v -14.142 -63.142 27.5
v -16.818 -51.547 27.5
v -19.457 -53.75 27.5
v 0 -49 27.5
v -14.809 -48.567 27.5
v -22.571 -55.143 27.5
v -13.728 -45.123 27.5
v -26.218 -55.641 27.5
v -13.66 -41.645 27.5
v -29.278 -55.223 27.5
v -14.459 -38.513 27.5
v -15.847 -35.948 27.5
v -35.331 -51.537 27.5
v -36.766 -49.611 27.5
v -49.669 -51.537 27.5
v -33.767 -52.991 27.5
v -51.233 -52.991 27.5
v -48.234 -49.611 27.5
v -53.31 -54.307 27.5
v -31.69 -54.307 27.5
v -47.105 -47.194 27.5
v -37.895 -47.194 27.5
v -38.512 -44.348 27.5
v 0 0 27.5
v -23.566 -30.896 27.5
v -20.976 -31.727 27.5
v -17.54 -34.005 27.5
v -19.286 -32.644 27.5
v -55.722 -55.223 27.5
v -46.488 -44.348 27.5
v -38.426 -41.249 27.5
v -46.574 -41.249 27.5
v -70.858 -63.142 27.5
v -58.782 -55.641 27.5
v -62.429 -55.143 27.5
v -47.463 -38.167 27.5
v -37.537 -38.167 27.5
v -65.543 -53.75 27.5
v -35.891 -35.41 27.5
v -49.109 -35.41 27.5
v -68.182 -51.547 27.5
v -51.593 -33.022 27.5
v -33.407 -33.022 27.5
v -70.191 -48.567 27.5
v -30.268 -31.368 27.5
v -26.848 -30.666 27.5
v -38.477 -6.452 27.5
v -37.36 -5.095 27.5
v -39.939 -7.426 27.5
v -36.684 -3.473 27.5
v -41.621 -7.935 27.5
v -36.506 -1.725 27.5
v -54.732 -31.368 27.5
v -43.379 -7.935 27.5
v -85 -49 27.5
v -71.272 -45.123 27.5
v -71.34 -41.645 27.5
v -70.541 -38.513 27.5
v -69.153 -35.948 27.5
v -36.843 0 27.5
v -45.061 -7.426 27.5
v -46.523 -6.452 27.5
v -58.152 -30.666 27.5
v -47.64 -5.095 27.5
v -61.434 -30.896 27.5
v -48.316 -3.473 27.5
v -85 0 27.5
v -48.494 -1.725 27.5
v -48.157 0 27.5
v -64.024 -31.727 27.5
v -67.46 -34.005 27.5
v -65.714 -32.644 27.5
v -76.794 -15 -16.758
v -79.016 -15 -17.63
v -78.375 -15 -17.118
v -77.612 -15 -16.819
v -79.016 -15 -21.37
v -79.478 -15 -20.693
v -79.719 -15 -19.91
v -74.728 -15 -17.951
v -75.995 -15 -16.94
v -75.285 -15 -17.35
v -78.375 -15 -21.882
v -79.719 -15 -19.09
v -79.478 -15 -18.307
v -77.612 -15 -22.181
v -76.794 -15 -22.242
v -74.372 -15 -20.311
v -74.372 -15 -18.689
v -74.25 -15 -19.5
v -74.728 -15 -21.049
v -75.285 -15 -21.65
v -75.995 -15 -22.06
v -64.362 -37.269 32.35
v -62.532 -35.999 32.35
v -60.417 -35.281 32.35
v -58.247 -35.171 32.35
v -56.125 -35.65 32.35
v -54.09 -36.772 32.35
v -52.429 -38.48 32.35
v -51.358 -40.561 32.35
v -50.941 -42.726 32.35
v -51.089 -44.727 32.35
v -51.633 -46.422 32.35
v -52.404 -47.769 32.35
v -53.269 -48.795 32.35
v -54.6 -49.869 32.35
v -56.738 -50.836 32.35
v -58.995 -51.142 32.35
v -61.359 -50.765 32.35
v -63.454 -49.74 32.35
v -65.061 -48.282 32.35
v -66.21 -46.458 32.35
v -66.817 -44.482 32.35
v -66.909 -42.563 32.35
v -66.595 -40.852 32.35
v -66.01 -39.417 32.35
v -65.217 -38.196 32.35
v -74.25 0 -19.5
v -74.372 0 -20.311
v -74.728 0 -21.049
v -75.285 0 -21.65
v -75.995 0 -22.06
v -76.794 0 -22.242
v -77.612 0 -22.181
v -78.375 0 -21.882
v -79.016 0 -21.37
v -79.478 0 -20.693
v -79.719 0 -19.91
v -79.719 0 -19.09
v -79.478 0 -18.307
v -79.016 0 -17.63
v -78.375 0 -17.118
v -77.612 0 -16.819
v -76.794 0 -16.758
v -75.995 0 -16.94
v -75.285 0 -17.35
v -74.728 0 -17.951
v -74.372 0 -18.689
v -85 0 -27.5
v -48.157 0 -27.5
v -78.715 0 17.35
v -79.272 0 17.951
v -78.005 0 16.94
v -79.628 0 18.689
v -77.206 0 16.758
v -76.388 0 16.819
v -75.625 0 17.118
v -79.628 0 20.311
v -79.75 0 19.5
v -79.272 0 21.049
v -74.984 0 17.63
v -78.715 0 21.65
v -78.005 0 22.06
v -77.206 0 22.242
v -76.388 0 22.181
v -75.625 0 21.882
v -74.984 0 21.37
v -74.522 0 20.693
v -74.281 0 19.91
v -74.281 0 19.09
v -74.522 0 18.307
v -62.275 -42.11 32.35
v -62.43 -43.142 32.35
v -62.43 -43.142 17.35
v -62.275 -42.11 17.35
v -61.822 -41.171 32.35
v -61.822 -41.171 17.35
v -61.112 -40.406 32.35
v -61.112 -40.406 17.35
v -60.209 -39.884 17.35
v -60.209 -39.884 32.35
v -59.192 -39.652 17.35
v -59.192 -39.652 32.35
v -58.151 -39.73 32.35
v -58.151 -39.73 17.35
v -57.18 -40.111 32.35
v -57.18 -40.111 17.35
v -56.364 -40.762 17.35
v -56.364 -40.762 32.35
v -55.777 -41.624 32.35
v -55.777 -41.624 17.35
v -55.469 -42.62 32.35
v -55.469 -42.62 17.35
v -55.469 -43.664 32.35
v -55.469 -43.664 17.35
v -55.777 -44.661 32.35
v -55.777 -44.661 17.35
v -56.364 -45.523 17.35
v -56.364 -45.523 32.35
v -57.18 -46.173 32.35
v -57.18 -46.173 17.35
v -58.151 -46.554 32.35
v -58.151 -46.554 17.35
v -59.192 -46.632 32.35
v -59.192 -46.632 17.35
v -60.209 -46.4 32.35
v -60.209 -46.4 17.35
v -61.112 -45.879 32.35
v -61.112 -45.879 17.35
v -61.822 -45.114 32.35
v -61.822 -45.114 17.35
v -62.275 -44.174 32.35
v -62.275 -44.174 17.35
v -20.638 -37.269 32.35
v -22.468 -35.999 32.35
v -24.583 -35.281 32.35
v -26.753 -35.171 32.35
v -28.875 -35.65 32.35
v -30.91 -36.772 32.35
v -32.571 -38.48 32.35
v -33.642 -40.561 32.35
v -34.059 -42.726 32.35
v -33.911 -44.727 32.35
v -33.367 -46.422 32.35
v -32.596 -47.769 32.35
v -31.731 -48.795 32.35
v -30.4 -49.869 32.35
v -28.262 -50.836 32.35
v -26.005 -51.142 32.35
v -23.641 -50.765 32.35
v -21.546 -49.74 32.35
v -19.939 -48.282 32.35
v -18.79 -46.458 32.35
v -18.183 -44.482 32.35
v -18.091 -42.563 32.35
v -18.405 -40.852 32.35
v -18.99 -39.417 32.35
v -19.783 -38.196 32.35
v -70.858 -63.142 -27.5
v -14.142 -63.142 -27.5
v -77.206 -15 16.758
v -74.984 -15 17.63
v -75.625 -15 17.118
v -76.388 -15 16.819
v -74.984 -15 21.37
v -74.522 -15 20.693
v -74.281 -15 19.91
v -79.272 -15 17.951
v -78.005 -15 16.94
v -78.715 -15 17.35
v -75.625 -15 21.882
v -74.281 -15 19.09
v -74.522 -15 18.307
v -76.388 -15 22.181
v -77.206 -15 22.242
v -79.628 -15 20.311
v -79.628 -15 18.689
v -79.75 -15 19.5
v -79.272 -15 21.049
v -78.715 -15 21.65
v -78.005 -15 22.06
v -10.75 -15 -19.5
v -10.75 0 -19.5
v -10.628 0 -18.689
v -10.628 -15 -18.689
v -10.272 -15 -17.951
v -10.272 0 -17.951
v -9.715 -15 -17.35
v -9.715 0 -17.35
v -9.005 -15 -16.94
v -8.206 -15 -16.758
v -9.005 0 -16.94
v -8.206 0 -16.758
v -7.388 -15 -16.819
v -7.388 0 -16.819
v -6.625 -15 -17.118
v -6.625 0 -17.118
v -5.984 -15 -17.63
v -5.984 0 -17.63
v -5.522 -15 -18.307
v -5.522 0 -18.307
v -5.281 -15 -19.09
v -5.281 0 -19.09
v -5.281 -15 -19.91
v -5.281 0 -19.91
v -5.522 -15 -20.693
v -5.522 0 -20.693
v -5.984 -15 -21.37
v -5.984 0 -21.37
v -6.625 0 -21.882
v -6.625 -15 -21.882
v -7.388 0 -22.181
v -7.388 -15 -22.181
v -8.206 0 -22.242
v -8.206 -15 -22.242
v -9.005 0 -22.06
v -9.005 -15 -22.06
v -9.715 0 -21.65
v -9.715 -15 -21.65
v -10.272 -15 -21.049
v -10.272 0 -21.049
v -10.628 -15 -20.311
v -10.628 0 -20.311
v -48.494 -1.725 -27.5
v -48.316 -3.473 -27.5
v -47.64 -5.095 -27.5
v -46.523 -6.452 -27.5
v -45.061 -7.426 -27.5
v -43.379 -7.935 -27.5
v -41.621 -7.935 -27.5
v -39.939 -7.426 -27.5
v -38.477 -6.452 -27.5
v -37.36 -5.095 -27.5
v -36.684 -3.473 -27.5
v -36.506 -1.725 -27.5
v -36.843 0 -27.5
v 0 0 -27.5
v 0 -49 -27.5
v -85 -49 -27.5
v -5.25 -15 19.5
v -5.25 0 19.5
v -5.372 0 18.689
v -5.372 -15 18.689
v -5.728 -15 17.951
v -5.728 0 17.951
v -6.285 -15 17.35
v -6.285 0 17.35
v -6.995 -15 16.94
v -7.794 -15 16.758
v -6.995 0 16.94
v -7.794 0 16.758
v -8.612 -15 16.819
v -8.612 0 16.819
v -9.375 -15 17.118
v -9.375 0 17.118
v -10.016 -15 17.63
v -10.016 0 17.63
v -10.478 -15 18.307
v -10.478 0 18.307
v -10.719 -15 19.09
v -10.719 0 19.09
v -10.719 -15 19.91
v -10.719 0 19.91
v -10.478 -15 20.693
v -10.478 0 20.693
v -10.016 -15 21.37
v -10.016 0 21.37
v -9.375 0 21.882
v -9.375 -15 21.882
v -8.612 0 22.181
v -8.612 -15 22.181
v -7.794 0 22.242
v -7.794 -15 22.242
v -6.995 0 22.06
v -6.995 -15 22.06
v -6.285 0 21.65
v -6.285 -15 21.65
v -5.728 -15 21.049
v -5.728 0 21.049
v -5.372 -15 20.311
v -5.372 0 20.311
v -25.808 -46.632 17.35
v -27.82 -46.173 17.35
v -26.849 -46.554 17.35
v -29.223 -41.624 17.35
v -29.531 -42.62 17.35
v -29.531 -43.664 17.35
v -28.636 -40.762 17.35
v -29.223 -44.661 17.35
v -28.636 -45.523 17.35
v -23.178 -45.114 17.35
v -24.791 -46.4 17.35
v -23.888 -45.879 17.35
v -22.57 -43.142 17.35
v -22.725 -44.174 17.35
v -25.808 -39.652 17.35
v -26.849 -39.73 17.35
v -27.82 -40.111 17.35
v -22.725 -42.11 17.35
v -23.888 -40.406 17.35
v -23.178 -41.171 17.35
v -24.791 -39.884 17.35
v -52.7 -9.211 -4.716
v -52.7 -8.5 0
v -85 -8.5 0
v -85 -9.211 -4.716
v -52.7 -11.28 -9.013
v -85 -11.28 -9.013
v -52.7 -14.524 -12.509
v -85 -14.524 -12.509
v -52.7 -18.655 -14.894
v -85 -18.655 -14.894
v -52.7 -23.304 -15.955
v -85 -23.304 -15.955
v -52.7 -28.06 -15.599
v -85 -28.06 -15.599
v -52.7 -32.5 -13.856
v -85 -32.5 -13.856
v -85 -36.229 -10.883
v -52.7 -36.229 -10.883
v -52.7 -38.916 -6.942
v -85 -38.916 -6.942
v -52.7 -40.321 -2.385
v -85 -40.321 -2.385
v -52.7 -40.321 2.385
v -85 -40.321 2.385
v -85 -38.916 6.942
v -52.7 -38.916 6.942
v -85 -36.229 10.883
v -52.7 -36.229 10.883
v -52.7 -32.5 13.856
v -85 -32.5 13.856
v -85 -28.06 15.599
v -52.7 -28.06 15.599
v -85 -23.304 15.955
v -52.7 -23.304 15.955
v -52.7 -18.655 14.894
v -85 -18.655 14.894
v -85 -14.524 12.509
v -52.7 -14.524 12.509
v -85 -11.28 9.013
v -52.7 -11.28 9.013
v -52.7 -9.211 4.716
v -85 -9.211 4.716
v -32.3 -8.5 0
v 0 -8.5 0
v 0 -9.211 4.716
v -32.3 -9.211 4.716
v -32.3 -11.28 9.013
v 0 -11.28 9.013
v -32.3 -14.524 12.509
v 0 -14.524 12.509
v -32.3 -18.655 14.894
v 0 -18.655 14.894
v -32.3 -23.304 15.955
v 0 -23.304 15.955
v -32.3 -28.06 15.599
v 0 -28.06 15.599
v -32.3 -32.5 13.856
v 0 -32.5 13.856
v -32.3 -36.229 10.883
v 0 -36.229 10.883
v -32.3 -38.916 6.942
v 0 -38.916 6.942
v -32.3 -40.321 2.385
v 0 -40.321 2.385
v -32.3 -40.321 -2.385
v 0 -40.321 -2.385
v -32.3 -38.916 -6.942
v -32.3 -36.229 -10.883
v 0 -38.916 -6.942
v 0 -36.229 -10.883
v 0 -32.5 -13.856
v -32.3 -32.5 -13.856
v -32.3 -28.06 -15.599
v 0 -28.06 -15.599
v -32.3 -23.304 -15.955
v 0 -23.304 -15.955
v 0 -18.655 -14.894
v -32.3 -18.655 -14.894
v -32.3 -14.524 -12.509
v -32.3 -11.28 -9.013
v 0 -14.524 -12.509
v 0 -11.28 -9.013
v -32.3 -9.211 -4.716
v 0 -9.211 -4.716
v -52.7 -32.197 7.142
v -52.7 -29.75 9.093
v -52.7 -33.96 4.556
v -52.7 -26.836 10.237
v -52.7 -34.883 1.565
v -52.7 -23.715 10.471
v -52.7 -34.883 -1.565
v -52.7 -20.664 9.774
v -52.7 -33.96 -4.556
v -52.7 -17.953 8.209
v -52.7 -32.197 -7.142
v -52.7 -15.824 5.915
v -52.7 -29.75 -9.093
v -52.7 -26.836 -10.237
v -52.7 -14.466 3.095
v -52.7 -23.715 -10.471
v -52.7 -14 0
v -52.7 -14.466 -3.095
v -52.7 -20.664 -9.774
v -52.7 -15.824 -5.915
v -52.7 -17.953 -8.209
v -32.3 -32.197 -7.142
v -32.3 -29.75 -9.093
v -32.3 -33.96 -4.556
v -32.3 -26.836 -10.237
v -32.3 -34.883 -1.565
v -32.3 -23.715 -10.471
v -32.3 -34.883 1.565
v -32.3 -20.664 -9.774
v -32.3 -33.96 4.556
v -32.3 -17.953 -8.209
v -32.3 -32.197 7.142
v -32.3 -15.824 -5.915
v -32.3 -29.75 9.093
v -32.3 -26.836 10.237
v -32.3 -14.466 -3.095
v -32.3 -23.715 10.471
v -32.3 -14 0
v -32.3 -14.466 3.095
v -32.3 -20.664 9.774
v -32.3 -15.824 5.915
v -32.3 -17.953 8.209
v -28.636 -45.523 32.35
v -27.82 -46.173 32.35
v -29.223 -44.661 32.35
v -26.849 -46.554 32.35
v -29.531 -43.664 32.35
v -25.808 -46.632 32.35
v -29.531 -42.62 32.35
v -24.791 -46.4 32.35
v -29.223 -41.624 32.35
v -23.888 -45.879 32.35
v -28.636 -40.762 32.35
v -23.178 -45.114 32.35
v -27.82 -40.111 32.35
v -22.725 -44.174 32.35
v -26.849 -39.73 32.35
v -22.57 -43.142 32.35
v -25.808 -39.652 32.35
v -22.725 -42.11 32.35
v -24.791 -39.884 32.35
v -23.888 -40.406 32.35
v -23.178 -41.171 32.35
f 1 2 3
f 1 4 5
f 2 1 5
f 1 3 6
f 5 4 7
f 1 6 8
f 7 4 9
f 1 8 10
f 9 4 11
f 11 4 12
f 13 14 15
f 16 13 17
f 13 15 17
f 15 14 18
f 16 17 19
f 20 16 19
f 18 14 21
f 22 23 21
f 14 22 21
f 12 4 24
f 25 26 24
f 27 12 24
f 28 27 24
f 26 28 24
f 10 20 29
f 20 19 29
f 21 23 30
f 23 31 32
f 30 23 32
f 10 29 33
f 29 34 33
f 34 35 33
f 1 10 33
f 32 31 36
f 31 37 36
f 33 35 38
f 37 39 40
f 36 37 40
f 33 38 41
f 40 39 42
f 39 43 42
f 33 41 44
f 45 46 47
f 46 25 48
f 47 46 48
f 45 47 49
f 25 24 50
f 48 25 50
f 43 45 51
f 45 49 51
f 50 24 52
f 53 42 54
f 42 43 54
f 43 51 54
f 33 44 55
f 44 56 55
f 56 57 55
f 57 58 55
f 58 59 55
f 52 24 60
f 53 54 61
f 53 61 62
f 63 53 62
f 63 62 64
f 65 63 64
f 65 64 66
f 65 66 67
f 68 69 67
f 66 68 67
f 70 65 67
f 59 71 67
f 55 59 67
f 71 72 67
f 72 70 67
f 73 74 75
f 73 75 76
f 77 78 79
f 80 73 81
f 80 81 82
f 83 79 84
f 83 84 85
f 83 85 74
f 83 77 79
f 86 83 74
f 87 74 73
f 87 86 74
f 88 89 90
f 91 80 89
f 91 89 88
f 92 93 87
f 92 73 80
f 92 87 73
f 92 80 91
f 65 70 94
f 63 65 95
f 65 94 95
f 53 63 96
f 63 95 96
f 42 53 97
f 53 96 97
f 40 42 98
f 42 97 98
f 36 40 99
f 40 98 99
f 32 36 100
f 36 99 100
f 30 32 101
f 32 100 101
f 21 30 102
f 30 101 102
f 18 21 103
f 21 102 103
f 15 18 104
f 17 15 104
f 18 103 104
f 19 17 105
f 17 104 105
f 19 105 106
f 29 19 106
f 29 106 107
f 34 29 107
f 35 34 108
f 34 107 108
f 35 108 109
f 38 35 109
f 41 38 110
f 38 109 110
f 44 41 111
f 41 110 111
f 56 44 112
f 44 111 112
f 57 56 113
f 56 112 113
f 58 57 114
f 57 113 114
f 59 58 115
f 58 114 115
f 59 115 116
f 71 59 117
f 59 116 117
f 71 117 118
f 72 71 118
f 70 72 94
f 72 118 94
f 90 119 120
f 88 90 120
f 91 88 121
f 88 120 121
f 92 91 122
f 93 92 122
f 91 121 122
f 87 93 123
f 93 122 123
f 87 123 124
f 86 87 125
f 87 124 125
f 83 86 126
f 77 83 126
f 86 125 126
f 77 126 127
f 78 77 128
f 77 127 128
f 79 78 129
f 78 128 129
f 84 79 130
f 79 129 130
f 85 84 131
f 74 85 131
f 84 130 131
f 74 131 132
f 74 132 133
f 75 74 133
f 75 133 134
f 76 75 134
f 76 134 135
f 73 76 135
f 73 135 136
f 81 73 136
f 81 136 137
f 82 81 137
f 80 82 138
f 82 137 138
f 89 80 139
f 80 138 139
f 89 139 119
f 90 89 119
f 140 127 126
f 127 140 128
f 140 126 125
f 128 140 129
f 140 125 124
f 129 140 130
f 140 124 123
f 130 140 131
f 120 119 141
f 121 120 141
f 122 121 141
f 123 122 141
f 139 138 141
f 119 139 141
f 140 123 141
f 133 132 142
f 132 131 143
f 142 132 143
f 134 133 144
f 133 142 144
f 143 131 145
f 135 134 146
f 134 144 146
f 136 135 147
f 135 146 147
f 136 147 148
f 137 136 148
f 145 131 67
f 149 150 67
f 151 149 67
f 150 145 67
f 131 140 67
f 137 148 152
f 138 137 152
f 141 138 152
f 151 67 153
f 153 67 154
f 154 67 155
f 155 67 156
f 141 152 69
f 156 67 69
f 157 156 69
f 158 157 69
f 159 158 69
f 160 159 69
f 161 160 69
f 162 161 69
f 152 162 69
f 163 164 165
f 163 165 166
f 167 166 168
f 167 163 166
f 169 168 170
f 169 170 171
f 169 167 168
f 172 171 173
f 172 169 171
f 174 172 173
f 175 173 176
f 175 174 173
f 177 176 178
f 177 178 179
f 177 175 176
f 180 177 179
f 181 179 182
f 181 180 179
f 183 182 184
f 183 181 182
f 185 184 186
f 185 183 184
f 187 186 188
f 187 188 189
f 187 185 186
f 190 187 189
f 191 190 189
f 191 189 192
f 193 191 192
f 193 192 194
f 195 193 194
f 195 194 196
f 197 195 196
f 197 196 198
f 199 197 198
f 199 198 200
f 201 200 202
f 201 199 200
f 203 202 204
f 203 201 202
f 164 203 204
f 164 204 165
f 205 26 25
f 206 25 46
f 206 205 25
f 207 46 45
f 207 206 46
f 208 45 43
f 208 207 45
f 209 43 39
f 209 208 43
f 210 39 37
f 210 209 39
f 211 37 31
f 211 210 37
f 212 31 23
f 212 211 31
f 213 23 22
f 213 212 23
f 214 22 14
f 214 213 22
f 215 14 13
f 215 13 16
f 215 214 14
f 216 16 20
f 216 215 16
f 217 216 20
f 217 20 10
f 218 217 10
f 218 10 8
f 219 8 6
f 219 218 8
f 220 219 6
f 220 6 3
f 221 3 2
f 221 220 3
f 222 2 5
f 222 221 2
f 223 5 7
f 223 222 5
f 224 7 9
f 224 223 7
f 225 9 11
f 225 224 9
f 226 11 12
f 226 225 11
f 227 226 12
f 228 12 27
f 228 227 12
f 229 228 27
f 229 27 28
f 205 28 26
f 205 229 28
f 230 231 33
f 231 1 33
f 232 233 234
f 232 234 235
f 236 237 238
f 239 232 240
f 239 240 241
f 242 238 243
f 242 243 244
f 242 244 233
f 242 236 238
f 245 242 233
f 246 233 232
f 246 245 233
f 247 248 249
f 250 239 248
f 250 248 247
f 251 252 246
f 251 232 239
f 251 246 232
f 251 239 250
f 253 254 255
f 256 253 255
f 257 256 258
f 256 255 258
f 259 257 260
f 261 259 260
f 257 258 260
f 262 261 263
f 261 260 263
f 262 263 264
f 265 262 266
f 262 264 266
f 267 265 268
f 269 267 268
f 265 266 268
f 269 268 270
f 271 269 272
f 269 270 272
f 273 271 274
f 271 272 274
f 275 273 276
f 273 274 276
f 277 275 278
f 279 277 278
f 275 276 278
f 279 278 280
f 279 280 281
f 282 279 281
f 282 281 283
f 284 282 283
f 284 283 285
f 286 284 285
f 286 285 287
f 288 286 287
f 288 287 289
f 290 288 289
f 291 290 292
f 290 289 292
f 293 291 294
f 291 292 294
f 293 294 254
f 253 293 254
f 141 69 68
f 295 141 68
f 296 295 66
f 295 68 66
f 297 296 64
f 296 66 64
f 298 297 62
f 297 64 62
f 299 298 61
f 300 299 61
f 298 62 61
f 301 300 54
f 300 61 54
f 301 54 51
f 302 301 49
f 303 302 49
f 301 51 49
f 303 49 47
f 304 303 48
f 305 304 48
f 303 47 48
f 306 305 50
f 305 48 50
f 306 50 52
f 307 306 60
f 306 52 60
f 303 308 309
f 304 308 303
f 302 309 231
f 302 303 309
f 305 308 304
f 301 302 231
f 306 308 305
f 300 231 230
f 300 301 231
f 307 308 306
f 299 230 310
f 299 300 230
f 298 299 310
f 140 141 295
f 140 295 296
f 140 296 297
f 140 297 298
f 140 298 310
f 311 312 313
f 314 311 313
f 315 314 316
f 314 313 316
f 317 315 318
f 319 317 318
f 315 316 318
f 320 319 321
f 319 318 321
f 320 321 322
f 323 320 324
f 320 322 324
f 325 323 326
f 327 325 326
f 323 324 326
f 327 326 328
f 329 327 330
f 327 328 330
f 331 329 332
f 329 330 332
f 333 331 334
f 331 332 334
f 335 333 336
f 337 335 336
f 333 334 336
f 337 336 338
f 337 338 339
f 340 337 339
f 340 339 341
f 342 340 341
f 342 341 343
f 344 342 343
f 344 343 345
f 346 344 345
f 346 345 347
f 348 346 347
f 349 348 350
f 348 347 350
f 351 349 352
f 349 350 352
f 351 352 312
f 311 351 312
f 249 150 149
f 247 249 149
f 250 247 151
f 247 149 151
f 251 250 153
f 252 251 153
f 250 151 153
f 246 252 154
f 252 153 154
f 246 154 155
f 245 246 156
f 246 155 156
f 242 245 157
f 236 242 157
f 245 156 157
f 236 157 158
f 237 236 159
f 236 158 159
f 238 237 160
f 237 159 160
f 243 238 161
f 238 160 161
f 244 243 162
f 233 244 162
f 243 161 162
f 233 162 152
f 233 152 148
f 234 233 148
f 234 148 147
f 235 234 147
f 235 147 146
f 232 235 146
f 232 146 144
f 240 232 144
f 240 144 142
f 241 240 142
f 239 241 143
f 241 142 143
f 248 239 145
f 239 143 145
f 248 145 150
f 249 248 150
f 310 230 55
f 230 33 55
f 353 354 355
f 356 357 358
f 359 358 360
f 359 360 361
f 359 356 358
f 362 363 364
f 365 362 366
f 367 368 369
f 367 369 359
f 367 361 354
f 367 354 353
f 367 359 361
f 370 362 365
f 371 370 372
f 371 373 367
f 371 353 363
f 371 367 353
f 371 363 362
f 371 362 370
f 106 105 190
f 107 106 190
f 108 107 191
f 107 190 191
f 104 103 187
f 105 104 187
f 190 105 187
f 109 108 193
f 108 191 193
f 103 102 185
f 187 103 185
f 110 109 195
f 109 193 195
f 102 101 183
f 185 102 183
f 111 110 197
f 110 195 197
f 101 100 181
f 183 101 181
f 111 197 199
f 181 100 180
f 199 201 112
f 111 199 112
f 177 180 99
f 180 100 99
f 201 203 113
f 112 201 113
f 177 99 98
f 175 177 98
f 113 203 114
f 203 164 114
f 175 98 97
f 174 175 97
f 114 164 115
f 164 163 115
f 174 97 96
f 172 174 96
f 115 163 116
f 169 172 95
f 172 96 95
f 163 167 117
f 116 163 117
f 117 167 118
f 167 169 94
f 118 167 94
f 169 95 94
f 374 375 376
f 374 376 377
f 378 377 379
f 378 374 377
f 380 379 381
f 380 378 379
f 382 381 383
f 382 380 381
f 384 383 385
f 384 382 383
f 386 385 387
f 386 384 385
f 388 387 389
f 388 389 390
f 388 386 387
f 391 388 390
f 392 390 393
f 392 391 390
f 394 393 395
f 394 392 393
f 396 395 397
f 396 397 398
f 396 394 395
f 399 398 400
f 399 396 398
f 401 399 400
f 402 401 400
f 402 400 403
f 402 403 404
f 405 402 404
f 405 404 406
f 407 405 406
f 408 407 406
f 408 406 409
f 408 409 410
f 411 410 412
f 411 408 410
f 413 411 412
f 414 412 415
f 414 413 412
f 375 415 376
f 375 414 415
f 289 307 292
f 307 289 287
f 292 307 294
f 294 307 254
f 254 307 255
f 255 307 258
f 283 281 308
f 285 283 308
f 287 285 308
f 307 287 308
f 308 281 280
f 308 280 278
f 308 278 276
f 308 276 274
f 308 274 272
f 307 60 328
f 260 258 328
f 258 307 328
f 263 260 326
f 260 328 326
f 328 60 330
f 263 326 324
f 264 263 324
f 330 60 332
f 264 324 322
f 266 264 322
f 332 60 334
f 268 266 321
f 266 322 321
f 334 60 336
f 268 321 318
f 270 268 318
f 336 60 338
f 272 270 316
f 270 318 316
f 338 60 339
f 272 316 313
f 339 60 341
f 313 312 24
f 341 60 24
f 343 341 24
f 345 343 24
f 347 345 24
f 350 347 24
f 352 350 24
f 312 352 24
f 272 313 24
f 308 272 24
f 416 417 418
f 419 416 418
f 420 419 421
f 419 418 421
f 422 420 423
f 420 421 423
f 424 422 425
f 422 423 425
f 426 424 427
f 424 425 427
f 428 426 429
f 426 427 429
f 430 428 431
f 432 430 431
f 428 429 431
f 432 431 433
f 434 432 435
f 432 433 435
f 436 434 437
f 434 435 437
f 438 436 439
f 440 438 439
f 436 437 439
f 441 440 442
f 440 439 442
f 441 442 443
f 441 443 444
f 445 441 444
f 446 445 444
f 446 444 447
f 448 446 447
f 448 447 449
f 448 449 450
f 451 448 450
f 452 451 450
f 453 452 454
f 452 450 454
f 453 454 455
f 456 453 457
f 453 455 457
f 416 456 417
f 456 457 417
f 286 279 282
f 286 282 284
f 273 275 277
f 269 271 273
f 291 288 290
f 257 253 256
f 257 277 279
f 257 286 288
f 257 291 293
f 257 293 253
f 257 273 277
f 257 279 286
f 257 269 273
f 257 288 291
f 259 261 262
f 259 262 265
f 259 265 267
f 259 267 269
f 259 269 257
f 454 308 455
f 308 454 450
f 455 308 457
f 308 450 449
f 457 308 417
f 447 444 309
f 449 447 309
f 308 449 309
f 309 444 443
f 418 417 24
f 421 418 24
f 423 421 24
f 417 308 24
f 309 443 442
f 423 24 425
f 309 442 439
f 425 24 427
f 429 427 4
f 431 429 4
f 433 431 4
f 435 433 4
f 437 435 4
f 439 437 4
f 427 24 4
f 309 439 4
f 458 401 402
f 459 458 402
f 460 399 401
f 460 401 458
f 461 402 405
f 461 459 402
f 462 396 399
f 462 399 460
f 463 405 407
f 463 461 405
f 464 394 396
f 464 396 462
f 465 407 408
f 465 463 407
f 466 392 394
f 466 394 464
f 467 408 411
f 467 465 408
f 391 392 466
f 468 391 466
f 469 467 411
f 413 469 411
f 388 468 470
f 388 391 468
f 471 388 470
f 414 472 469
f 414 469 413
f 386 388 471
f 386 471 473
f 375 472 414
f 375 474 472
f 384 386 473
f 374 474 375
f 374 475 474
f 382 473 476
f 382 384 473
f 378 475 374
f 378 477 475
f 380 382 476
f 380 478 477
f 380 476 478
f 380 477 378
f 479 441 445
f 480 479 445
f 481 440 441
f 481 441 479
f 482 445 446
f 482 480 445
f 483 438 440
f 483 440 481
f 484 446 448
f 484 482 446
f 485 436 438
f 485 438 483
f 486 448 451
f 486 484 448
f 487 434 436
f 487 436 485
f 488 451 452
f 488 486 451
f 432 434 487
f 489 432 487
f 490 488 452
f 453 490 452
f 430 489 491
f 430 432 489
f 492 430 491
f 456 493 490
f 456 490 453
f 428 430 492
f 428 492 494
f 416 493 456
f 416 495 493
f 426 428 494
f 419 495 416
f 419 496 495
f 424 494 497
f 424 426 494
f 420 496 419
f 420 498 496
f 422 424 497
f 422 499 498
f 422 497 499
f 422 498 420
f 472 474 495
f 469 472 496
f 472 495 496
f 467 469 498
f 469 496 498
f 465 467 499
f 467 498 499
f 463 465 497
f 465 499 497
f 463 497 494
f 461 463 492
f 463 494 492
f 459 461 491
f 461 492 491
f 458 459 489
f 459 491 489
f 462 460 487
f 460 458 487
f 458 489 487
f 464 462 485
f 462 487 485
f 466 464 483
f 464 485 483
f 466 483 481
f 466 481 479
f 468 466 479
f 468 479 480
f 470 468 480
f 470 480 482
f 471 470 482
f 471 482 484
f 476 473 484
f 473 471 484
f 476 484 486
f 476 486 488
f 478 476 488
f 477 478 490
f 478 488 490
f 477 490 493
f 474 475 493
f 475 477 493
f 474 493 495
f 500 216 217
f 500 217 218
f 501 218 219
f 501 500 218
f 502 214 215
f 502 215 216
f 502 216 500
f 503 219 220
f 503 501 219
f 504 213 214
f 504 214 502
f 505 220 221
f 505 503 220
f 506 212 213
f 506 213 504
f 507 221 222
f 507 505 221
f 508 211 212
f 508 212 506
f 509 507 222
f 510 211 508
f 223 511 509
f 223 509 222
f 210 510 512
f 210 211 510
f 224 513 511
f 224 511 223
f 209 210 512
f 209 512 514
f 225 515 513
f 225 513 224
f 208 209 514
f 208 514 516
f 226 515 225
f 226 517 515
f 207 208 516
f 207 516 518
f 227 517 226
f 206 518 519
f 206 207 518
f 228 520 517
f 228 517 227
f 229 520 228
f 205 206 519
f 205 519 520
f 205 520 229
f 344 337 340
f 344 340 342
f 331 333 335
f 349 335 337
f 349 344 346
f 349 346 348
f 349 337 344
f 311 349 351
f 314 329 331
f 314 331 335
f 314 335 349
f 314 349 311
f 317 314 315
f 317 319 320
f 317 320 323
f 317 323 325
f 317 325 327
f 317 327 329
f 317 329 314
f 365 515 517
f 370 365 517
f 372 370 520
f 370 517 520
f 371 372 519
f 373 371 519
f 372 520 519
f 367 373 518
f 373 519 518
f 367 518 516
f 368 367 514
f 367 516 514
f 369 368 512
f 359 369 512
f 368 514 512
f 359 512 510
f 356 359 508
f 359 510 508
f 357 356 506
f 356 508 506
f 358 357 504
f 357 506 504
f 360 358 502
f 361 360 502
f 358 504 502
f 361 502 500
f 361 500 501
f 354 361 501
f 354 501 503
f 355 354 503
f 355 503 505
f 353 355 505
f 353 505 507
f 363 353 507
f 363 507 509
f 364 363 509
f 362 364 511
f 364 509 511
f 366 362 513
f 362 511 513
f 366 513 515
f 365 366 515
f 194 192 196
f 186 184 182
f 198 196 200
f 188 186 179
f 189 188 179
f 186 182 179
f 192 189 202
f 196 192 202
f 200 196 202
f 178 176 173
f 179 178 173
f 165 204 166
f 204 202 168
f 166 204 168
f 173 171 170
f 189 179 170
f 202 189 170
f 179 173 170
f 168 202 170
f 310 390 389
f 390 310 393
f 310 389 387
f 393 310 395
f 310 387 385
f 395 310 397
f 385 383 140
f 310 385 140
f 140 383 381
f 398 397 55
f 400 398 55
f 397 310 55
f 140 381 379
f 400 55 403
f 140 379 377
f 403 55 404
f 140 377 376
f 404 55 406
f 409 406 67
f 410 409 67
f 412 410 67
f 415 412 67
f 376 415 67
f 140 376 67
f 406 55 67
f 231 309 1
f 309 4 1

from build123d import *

# Parameters (mm, degrees)
BOSS_EXTRUDE1_DEPTH = 27.5
CUT_EXTRUDE1_DEPTH  = 55
SKETCH3_R           = 10.5
CUT_EXTRUDE2_DEPTH  = 85
SKETCH4_R           = 16
SKETCH4_R_2         = 10.5
CUT_EXTRUDE3_DEPTH  = 32.3
CUT_EXTRUDE4_START  = -32.3
SKETCH5_R           = 16
SKETCH5_R_2         = 10.5
CUT_EXTRUDE4_DEPTH  = 32.3
SKETCH6_R           = 2.75
CUT_EXTRUDE5_DEPTH  = 15
SKETCH9_R           = 3.5
CUT_EXTRUDE6_DEPTH  = 15


with BuildPart() as part:
    # Sketch1 → Boss-Extrude1 (new, symmetric)
    with BuildSketch(Plane.XY):
        Polygon((0, 0), (0, -49), (-14.142135624, -63.142135624), (-70.857864376, -63.142135624), (-85, -49), (-85, 0), align=None)
    extrude(amount=BOSS_EXTRUDE1_DEPTH, both=True)

    # Sketch2 → Cut-Extrude1 (cut)
    with BuildSketch(Plane.XY.offset(27.5)):
        with BuildLine():
            Line((-36.843145751, 0), (-48.156854249, 0))
            ThreePointArc((-48.156854249, 0), (-42.5, -8), (-36.843145751, 0))
        make_face()
    extrude(amount=-CUT_EXTRUDE1_DEPTH, mode=Mode.SUBTRACT)

    # Sketch3 → Cut-Extrude2 (cut)
    with BuildSketch(Plane(origin=(0, 0, 0), x_dir=(0, 0, -1), z_dir=(1, 0, 0))):
        with Locations(Location((0, -24.5, 0), (0, 0, 90))):
            Circle(SKETCH3_R)
    extrude(amount=-CUT_EXTRUDE2_DEPTH, mode=Mode.SUBTRACT)

    # Sketch4 → Cut-Extrude3 (cut)
    with BuildSketch(Plane(origin=(0, 0, 0), x_dir=(0, 0, -1), z_dir=(1, 0, 0))):
        with Locations(Location((0, -24.5, 0), (0, 0, 90))):
            Circle(SKETCH4_R)
        with Locations(Location((0, -24.5, 0), (0, 0, 90))):
            Circle(SKETCH4_R_2, mode=Mode.SUBTRACT)
    extrude(amount=-CUT_EXTRUDE3_DEPTH, mode=Mode.SUBTRACT)

    # Sketch5 → Cut-Extrude4 (cut)
    with BuildSketch(Plane.ZY.offset(85).offset(CUT_EXTRUDE4_START)):
        with Locations(Location((0, -24.5, 0), (0, 0, 90))):
            Circle(SKETCH5_R)
        with Locations(Location((0, -24.5, 0), (0, 0, 90))):
            Circle(SKETCH5_R_2, mode=Mode.SUBTRACT)
    extrude(amount=CUT_EXTRUDE4_DEPTH, mode=Mode.SUBTRACT)

    # Sketch6 → Cut-Extrude5 (cut)
    with BuildSketch(Plane(origin=(0, 0, 0), x_dir=(1, 0, 0), z_dir=(0, 1, 0))):
        with Locations(Location((-8, 19.5, 0), (0, 0, 180))):
            Circle(SKETCH6_R)
        with Locations((-8, -19.5)):
            Circle(SKETCH6_R)
        with Locations(Location((-77, -19.5, 0), (0, 0, 180))):
            Circle(SKETCH6_R)
        with Locations((-77, 19.5)):
            Circle(SKETCH6_R)
    extrude(amount=-CUT_EXTRUDE5_DEPTH, mode=Mode.SUBTRACT)

    # Loft1: read off the stored shape, not the designer's step
    # Loft1: loft between two sections, ruled curve by curve
    loft1_from = [
        Edge.make_bspline([(-20.976227121, -31.727080746, 27.5), (-43.806336876, -21.539534988, 27.5), (-53.993882634, -44.369644744, 27.5), (-31.163772879, -54.557190501, 27.5), (-8.333663124, -64.744736259, 27.5), (1.853882634, -41.914626504, 27.5), (-20.976227121, -31.727080746, 27.5)], [0, 0, 0, 0, 0.5, 0.5, 0.5, 1, 1, 1, 1], 3, [1, 0.333333333, 0.333333333, 1, 0.333333333, 0.333333333, 1]),
    ]
    loft1_to = [
        Edge.make_bspline([(-20.63774875, -37.26926185, 32.35), (-32.383496297, -26.40475935, 32.35), (-43.247998797, -38.150506897, 32.35), (-31.50225125, -49.015009397, 32.35), (-19.756503703, -59.879511897, 32.35), (-8.892001203, -48.13376435, 32.35), (-20.63774875, -37.26926185, 32.35)], [0, 0, 0, 0, 0.5, 0.5, 0.5, 1, 1, 1, 1], 3, [1, 0.333333333, 0.333333333, 1, 0.333333333, 0.333333333, 1]),
    ]
    loft1 = Solid(Shell([*[Face.make_surface_from_curves(loft1_from[k], loft1_to[k]) for k in range(1)], Face(Wire(loft1_from)), Face(Wire(loft1_to))]))
    add(loft1)

    # Sketch9 → Cut-Extrude6 (cut)
    with BuildSketch(Plane.XY.offset(32.35)):
        with Locations((-26.07, -43.142135624)):
            Circle(SKETCH9_R)
    cut_extrude6 = extrude(amount=-CUT_EXTRUDE6_DEPTH, mode=Mode.SUBTRACT)

    # Mirror1: Loft1, Cut-Extrude6 across plane
    add(loft1.mirror(Plane(origin=(-42.5, 0, 0), x_dir=(0, 0, 1), z_dir=(1, 0, 0))))
    add(cut_extrude6.mirror(Plane(origin=(-42.5, 0, 0), x_dir=(0, 0, 1), z_dir=(1, 0, 0))), mode=Mode.SUBTRACT)


solid = part.part
